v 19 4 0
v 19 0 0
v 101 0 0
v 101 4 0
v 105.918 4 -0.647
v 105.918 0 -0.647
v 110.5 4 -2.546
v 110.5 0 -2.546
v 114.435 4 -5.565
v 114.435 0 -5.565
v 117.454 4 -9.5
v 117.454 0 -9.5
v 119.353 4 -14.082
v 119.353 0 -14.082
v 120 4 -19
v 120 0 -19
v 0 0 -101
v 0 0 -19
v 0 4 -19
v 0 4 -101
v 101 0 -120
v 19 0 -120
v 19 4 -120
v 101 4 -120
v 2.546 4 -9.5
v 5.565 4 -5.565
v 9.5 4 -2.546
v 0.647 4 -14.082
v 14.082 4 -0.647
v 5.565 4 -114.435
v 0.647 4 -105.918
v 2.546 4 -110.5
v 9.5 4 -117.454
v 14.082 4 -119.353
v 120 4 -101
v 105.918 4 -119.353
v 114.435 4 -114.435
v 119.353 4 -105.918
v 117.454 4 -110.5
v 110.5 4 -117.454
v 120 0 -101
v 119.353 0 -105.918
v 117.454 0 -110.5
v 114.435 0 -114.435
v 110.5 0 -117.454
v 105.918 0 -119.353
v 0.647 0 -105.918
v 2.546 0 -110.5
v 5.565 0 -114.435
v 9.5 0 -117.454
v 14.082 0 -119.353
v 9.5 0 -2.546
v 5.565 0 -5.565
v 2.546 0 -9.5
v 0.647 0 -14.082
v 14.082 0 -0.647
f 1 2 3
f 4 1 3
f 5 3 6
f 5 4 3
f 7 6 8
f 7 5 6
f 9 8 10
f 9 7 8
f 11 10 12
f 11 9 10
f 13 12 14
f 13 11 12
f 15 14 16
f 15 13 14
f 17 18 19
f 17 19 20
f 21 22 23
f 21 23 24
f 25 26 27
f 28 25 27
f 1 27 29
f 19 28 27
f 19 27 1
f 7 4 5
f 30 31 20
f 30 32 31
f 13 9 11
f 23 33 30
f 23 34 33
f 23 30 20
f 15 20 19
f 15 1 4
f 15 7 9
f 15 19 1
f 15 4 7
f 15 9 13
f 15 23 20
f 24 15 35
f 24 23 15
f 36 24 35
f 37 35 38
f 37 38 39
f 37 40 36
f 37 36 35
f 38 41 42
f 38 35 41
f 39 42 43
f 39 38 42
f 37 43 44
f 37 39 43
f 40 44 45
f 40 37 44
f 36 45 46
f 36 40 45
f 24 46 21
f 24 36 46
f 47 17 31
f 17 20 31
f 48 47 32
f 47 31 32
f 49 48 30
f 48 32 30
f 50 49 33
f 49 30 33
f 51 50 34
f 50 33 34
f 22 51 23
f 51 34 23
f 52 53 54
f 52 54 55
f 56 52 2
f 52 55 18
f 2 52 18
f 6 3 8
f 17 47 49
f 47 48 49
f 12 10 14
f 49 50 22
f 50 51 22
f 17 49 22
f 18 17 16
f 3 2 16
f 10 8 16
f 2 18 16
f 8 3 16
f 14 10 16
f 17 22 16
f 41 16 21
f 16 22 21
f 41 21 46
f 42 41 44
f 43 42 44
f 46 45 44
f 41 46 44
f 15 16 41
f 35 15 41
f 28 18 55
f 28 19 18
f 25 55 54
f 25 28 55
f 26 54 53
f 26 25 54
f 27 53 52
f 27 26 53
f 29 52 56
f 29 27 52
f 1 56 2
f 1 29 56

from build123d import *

# Parameters (mm, degrees)
SKETCH1_W           = 120
SKETCH1_H           = 120
BOSS_EXTRUDE1_DEPTH = 4
FILLET1_R           = 19


with BuildPart() as part:
    # Sketch1 → Boss-Extrude1 (new body)
    with BuildSketch(Plane(origin=(0, 0, 0), x_dir=(1, 0, 0), z_dir=(0, 1, 0))):
        with Locations((60, 60)):
            Rectangle(SKETCH1_W, SKETCH1_H)
    extrude(amount=BOSS_EXTRUDE1_DEPTH)

    # Fillet1
    fillet1_edges = [part.edges().sort_by_distance(p)[0] for p in [
        (0, 2, -120),
        (120, 2, -120),
        (120, 2, 0),
        (0, 2, 0),
    ]]
    fillet(fillet1_edges, radius=FILLET1_R)


solid = part.part
